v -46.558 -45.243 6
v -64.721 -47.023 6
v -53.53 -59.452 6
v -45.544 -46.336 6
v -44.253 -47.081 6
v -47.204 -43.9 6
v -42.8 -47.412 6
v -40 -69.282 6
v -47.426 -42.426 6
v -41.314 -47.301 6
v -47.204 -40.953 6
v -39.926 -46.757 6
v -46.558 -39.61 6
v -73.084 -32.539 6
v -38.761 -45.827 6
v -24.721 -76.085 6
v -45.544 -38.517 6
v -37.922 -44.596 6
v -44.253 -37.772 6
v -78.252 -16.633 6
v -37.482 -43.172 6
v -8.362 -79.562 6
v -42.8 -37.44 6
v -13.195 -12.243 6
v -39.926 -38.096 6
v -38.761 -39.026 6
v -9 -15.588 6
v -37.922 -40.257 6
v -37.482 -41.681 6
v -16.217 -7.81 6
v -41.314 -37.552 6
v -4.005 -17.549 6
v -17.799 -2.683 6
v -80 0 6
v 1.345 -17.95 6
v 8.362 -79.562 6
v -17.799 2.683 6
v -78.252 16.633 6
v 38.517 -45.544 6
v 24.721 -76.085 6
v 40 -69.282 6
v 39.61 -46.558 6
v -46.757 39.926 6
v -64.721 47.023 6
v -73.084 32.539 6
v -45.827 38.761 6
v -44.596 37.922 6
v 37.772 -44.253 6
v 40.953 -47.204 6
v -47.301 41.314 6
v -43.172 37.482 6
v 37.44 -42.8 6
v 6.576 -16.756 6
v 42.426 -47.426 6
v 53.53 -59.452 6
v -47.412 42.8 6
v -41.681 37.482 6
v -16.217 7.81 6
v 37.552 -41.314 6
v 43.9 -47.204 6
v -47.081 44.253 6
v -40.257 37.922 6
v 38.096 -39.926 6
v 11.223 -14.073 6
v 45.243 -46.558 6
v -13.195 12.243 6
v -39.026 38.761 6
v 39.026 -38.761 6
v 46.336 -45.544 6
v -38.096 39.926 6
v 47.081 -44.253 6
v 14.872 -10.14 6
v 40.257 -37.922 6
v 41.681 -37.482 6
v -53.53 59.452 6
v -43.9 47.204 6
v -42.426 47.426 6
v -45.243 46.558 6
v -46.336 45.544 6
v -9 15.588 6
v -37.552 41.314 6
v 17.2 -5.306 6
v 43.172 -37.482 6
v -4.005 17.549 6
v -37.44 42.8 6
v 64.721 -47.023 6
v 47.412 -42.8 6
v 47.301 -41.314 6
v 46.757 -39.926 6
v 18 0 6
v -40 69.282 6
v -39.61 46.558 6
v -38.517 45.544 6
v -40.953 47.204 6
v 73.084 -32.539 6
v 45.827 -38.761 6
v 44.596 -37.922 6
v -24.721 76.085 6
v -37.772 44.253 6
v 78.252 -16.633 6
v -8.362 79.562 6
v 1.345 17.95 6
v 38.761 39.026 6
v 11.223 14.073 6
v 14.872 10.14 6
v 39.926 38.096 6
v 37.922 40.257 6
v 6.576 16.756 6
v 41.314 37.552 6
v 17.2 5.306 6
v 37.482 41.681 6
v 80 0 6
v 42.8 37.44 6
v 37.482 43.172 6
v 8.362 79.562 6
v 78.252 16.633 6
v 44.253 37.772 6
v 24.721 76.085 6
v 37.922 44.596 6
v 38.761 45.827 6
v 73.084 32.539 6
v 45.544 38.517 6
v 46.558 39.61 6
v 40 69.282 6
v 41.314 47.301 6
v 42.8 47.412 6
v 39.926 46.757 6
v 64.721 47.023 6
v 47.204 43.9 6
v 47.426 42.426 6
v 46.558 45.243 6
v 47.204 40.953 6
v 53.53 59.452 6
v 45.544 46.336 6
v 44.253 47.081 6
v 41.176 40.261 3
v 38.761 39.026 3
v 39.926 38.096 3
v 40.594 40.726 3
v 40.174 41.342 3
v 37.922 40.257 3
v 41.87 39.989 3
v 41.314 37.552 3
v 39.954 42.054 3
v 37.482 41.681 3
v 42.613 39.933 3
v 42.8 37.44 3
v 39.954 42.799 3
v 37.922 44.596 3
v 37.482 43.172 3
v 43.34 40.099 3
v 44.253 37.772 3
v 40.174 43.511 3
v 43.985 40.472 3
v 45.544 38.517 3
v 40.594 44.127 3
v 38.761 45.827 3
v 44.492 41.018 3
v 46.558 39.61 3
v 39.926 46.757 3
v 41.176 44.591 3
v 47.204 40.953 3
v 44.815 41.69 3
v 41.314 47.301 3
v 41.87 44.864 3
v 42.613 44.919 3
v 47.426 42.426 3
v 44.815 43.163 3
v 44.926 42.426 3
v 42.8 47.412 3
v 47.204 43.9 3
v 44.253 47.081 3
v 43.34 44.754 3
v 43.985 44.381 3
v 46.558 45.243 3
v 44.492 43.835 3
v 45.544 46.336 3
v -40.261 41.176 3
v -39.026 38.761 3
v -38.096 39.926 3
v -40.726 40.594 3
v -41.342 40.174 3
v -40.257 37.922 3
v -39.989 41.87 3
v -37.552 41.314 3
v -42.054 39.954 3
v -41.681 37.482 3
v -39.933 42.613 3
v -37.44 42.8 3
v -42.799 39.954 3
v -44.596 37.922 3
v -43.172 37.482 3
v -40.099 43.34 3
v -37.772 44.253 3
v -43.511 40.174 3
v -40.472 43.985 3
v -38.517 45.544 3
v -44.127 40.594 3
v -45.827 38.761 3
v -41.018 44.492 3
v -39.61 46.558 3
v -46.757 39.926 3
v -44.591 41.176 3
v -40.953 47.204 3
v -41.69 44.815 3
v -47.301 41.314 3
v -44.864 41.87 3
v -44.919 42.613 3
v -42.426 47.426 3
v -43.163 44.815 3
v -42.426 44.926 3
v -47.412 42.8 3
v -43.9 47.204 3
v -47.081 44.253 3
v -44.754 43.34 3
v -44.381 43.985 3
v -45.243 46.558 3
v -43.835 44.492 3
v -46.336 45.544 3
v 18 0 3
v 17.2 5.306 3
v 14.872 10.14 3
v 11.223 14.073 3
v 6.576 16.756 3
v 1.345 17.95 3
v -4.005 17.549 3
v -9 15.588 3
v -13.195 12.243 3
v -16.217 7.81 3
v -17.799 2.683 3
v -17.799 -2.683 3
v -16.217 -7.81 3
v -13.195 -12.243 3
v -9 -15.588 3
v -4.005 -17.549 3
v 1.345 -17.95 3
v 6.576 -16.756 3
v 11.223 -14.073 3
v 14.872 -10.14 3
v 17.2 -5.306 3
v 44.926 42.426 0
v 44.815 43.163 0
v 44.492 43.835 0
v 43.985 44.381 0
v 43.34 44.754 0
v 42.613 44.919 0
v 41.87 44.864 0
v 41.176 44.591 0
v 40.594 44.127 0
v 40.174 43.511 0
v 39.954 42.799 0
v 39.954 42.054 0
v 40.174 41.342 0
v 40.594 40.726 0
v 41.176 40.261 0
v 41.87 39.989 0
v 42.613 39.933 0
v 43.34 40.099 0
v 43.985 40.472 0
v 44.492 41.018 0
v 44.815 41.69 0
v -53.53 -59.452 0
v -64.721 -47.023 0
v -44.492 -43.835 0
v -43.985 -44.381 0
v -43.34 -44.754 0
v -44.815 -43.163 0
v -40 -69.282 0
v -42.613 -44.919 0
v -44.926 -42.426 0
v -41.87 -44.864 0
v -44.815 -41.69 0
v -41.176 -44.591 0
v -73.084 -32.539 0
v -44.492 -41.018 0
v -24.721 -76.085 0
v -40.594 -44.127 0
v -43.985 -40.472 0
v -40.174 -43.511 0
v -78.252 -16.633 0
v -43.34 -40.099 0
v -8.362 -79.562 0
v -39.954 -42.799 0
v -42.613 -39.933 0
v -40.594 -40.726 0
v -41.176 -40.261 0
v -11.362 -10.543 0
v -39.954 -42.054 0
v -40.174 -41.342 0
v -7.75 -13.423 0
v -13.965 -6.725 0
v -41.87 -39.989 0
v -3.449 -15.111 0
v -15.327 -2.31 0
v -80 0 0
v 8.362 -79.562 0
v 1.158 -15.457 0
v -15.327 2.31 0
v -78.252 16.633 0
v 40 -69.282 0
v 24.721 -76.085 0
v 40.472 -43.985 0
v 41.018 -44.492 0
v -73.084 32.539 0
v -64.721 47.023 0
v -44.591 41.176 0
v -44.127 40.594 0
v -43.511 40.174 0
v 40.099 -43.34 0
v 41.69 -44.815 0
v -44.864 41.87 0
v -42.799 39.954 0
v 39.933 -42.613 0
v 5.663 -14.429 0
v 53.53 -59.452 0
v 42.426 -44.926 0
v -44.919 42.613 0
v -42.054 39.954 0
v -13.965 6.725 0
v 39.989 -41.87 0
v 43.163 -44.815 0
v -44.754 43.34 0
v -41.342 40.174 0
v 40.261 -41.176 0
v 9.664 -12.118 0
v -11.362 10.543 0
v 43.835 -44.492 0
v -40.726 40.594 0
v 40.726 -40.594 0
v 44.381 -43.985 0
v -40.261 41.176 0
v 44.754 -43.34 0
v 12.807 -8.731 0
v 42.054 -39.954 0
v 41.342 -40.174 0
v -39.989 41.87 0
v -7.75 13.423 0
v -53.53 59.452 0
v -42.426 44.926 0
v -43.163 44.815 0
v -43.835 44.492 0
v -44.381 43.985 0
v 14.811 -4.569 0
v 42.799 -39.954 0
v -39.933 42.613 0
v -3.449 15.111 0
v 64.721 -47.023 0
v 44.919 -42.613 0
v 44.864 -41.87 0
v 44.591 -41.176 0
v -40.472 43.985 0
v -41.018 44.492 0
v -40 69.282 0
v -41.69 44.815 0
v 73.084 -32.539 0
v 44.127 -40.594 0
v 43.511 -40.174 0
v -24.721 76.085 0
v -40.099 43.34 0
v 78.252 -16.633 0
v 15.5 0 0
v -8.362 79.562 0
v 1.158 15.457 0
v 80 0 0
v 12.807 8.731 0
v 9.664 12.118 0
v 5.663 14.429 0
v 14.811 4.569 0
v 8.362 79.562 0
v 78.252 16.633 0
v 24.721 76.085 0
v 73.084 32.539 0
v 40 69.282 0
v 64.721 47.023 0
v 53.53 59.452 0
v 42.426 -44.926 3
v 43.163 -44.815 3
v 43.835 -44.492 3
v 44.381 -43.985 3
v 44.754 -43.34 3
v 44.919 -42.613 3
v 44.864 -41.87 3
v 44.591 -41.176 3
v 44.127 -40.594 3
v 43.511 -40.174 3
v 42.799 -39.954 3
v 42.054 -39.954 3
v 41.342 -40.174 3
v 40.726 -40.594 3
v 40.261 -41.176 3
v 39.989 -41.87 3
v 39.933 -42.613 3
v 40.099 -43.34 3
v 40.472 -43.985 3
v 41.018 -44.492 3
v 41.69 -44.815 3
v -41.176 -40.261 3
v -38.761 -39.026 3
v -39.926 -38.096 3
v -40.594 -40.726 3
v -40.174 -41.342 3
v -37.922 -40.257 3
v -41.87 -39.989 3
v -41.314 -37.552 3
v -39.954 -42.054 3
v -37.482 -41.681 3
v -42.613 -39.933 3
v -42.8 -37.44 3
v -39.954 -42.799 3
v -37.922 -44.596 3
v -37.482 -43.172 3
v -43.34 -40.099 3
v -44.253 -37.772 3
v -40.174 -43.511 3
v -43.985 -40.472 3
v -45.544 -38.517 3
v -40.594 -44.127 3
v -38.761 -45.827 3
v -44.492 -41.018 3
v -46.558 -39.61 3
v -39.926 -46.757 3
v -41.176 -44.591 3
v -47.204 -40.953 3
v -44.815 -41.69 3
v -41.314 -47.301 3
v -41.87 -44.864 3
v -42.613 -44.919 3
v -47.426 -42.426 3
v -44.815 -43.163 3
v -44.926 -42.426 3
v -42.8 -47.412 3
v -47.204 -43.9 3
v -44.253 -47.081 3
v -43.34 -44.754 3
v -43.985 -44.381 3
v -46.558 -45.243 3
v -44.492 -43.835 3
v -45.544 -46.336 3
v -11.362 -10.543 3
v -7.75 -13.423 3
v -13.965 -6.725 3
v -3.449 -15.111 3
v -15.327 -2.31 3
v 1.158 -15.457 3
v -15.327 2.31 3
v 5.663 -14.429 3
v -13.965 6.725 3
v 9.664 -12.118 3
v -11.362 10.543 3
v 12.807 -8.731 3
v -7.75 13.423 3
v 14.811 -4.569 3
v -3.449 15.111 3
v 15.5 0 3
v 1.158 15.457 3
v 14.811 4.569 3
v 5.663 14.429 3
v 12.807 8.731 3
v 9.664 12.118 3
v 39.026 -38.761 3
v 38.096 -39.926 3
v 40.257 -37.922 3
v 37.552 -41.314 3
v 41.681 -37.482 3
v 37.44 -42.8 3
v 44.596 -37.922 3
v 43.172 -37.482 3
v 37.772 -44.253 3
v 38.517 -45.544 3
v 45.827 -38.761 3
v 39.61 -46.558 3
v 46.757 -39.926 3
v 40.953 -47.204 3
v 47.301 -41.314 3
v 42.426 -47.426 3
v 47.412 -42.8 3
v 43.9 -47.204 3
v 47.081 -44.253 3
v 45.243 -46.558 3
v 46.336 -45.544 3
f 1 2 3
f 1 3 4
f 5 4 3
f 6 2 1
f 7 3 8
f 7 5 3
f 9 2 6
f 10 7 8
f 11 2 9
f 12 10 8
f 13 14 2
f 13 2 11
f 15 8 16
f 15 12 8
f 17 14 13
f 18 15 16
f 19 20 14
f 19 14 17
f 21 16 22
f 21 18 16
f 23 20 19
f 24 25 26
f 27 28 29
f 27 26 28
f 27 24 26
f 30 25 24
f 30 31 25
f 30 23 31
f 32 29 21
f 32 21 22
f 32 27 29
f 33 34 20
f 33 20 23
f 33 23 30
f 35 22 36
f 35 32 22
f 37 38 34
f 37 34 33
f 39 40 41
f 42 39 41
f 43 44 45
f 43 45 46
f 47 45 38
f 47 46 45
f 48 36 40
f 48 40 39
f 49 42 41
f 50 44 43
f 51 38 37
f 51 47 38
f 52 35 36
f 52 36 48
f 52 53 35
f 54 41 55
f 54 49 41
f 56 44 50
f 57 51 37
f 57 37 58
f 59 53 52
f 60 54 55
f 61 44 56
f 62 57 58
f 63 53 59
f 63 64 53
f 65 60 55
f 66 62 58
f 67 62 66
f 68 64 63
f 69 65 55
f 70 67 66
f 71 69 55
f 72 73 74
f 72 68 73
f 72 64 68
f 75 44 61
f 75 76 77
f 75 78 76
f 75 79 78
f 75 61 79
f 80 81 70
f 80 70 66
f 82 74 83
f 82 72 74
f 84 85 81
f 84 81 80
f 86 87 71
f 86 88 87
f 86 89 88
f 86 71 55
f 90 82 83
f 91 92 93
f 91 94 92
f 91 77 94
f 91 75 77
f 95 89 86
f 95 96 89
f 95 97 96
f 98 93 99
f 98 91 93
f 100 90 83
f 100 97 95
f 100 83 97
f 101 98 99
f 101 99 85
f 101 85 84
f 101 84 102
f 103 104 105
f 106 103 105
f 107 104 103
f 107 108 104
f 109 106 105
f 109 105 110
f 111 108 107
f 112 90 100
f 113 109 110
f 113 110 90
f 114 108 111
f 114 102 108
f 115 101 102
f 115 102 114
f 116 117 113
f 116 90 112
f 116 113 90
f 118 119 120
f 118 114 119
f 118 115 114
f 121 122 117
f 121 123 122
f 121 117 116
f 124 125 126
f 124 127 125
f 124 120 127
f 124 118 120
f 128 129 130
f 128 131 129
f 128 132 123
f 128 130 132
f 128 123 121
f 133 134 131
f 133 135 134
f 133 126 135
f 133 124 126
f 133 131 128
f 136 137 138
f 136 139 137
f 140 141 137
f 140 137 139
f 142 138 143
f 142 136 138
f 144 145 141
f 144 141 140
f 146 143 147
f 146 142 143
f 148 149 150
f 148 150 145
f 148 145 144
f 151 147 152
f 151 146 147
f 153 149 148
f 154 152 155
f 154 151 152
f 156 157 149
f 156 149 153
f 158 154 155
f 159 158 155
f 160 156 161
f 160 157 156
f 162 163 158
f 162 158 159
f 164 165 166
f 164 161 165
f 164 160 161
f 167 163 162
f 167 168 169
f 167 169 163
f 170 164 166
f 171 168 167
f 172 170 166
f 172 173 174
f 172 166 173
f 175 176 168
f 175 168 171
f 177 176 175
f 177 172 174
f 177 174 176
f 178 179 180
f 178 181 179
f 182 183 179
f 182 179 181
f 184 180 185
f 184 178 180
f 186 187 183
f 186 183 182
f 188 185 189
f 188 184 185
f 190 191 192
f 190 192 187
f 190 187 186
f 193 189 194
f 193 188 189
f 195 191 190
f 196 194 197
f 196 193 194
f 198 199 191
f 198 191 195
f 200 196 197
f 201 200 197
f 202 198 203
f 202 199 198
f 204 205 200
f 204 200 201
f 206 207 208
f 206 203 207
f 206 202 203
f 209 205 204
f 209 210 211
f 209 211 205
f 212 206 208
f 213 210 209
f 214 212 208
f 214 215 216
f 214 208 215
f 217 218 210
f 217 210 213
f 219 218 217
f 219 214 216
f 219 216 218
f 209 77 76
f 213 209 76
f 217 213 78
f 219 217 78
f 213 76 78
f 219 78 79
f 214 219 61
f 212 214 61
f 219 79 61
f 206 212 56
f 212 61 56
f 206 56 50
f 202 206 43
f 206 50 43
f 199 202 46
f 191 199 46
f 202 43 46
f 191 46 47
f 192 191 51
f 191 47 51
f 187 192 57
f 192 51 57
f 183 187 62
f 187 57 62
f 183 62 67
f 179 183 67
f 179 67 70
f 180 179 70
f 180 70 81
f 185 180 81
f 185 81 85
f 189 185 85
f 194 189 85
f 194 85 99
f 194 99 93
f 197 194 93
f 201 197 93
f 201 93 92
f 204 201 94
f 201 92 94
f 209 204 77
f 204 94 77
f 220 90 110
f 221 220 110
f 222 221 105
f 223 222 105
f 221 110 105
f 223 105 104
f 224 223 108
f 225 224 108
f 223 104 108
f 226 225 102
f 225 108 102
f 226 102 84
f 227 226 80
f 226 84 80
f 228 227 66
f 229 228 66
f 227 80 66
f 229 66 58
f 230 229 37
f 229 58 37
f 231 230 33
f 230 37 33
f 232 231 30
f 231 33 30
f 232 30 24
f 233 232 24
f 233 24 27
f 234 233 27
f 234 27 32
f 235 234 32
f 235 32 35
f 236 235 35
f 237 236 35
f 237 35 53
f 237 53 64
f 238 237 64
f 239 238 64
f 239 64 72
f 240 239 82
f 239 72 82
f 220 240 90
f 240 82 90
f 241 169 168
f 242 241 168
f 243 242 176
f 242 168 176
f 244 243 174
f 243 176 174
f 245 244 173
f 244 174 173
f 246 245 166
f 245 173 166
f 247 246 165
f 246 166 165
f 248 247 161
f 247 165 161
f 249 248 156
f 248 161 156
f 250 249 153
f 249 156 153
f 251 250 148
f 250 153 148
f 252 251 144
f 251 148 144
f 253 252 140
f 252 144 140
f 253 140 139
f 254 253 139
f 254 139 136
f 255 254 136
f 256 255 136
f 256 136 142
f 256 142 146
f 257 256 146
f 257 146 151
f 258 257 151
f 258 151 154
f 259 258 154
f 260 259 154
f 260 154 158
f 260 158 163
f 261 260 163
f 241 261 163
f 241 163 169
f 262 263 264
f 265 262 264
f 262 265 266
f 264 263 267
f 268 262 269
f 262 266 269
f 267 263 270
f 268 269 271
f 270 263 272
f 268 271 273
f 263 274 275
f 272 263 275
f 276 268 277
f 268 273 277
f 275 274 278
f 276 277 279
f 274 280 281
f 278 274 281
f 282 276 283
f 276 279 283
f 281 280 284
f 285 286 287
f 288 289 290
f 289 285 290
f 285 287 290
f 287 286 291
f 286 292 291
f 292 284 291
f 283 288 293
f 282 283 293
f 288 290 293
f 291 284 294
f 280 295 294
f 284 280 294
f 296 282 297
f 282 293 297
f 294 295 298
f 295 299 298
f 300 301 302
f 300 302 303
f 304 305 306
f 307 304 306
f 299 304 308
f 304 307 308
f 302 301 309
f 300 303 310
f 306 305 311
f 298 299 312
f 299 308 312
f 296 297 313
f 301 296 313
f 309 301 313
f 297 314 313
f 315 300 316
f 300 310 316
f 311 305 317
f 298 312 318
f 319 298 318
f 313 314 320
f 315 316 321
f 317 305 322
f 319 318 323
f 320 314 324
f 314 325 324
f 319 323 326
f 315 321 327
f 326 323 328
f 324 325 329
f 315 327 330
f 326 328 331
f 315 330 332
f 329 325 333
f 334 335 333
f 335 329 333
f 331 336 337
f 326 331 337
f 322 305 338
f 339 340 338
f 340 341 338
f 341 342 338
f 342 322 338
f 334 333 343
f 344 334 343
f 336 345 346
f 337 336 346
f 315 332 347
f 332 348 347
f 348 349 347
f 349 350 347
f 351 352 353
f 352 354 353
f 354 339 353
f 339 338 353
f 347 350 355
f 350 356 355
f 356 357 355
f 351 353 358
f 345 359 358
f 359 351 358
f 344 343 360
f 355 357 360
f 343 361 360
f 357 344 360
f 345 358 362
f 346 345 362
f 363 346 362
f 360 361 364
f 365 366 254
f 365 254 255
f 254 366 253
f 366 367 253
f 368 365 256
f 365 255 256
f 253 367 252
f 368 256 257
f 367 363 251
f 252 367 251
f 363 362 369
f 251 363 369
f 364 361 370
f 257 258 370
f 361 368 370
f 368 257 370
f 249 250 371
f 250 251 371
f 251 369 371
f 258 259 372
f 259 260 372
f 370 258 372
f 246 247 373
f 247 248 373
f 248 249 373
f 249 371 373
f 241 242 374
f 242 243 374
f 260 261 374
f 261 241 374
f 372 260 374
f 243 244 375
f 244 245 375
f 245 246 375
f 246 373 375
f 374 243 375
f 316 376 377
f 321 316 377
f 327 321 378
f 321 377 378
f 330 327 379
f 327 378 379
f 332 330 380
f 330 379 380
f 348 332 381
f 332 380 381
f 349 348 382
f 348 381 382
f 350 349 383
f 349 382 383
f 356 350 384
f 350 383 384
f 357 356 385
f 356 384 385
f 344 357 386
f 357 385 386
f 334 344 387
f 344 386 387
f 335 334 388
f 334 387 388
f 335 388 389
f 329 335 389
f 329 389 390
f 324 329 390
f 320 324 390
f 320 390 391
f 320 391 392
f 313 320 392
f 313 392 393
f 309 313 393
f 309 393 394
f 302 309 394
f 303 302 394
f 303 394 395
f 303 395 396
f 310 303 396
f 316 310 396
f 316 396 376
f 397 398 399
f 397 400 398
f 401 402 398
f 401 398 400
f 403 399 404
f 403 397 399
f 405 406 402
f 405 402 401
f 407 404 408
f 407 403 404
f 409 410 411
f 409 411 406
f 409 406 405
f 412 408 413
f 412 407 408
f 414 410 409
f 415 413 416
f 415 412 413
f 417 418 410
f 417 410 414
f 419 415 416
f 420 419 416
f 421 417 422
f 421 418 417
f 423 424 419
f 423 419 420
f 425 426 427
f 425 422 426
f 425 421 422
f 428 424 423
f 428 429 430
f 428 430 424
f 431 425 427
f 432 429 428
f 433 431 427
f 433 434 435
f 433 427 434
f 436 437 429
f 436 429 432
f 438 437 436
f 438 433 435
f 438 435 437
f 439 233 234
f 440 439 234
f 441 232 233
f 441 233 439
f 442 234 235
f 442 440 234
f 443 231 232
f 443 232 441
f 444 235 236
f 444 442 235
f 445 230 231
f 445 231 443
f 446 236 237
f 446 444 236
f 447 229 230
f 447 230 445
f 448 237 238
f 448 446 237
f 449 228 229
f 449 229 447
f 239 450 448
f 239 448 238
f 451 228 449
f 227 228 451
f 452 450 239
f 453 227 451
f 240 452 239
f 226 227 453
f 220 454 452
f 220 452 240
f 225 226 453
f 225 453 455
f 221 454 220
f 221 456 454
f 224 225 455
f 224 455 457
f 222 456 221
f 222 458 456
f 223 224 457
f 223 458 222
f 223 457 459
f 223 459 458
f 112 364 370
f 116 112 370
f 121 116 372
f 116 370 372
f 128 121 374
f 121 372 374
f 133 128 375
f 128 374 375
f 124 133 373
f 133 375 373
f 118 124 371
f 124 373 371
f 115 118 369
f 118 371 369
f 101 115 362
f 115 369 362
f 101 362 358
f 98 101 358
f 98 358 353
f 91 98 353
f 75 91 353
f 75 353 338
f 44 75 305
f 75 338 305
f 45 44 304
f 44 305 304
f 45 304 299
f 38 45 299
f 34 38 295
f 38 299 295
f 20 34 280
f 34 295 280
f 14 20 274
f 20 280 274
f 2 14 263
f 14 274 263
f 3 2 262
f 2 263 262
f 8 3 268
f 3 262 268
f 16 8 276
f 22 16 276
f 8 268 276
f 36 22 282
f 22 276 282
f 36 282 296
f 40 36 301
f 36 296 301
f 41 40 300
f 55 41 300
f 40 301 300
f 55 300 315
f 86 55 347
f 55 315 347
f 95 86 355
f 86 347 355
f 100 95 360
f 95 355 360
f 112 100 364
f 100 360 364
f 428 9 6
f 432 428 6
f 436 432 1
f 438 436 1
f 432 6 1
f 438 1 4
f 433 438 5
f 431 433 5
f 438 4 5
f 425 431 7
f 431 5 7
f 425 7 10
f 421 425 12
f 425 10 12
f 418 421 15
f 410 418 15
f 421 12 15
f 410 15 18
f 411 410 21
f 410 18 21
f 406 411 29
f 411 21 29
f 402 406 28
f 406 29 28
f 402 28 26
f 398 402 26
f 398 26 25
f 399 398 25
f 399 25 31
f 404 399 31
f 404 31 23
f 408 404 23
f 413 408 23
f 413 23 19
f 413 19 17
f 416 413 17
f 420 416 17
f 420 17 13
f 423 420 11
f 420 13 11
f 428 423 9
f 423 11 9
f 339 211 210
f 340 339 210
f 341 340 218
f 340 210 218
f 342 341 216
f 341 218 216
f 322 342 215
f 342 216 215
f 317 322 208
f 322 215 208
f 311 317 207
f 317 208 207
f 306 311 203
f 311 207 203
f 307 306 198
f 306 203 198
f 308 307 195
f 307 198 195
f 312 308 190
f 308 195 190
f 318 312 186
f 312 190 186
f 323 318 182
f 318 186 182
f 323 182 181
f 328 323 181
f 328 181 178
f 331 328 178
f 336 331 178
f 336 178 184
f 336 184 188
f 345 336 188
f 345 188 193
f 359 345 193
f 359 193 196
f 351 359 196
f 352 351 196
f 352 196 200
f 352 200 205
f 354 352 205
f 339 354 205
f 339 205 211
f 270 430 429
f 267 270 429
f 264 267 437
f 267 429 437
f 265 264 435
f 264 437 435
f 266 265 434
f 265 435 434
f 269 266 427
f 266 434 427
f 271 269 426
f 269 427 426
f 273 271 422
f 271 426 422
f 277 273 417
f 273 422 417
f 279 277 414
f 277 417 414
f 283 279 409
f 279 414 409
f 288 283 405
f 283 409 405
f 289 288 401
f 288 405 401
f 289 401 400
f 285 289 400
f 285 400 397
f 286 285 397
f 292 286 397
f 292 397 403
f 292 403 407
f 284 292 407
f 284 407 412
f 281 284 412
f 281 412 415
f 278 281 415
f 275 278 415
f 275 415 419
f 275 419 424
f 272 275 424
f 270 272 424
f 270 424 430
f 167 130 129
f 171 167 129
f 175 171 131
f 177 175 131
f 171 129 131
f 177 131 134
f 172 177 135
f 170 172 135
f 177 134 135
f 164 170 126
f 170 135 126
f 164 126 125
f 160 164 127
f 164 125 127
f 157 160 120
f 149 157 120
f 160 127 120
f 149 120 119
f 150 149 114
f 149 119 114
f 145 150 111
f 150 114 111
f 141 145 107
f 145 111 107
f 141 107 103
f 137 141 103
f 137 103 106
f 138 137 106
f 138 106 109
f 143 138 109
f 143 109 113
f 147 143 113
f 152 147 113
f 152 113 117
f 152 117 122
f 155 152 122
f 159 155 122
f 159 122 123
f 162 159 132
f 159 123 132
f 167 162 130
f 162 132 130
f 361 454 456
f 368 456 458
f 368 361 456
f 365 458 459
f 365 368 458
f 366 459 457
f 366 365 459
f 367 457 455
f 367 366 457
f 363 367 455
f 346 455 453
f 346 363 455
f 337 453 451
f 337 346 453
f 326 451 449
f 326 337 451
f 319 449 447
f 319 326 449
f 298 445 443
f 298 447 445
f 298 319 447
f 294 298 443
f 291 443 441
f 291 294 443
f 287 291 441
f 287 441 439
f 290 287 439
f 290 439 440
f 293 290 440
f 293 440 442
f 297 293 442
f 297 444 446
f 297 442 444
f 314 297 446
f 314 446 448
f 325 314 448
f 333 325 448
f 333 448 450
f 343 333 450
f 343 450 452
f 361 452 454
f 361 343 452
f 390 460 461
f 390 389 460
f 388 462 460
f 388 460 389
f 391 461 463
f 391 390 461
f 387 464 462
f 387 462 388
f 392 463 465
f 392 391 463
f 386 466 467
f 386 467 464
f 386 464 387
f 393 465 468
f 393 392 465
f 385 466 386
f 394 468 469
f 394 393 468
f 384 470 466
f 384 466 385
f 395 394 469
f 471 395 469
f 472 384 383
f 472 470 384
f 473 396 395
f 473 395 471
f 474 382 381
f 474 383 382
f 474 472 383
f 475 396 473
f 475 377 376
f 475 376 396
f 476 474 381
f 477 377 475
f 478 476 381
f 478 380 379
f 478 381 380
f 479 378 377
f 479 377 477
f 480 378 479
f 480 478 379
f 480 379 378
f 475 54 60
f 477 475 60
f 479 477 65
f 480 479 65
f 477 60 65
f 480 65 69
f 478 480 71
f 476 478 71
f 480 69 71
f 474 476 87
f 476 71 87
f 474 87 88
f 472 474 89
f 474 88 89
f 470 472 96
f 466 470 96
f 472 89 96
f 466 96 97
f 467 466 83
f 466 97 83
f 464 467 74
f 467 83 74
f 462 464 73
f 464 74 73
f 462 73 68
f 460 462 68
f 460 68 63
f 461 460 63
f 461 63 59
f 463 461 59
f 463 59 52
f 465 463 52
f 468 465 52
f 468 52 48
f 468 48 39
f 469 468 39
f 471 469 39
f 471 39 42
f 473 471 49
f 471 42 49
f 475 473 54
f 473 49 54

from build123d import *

# Parameters (mm, degrees)
SKETCH006_R           = 80
SKETCH006_R_2         = 15.5
PAD002_DEPTH          = 6
SKETCH007_R           = 2.5
POCKET004_DEPTH       = 6
POLARPATTERN002_COUNT = 4
SKETCH008_R           = 5
POCKET005_DEPTH       = 3
POLARPATTERN003_COUNT = 4
SKETCH009_R           = 18
POCKET006_DEPTH       = 3


with BuildPart() as part:
    # Sketch006 → Pad002 (new body)
    with BuildSketch(Plane.XY):
        Circle(SKETCH006_R)
        Circle(SKETCH006_R_2, mode=Mode.SUBTRACT)
    extrude(amount=PAD002_DEPTH)

    # Sketch007 (on Face4 of Pad002) → Pocket004 (cut)
    with BuildSketch(Plane.XY.offset(6)):
        with Locations((42.426407, 42.426407)):
            Circle(SKETCH007_R)
    pocket004 = extrude(amount=-POCKET004_DEPTH, mode=Mode.SUBTRACT)

    # PolarPattern002: Pocket004 ×4 about axis
    polarpattern002_axis = Axis((0, 0, 6), (0, 0, 1))
    for i in range(1, POLARPATTERN002_COUNT):
        add(pocket004.rotate(polarpattern002_axis, i * 360 / POLARPATTERN002_COUNT), mode=Mode.SUBTRACT)

    # Sketch008 (on Face3 of PolarPattern002) → Pocket005 (cut)
    with BuildSketch(Plane.XY.offset(6)):
        with Locations((42.426407, 42.426407)):
            Circle(SKETCH008_R)
    pocket005 = extrude(amount=-POCKET005_DEPTH, mode=Mode.SUBTRACT)

    # PolarPattern003: Pocket005 ×4 about axis
    polarpattern003_axis = Axis((0, 0, 6), (0, 0, 1))
    for i in range(1, POLARPATTERN003_COUNT):
        add(pocket005.rotate(polarpattern003_axis, i * 360 / POLARPATTERN003_COUNT), mode=Mode.SUBTRACT)

    # Sketch009 (on Face3 of PolarPattern003) → Pocket006 (cut)
    with BuildSketch(Plane.XY.offset(6)):
        Circle(SKETCH009_R)
    extrude(amount=-POCKET006_DEPTH, mode=Mode.SUBTRACT)


solid = part.part
